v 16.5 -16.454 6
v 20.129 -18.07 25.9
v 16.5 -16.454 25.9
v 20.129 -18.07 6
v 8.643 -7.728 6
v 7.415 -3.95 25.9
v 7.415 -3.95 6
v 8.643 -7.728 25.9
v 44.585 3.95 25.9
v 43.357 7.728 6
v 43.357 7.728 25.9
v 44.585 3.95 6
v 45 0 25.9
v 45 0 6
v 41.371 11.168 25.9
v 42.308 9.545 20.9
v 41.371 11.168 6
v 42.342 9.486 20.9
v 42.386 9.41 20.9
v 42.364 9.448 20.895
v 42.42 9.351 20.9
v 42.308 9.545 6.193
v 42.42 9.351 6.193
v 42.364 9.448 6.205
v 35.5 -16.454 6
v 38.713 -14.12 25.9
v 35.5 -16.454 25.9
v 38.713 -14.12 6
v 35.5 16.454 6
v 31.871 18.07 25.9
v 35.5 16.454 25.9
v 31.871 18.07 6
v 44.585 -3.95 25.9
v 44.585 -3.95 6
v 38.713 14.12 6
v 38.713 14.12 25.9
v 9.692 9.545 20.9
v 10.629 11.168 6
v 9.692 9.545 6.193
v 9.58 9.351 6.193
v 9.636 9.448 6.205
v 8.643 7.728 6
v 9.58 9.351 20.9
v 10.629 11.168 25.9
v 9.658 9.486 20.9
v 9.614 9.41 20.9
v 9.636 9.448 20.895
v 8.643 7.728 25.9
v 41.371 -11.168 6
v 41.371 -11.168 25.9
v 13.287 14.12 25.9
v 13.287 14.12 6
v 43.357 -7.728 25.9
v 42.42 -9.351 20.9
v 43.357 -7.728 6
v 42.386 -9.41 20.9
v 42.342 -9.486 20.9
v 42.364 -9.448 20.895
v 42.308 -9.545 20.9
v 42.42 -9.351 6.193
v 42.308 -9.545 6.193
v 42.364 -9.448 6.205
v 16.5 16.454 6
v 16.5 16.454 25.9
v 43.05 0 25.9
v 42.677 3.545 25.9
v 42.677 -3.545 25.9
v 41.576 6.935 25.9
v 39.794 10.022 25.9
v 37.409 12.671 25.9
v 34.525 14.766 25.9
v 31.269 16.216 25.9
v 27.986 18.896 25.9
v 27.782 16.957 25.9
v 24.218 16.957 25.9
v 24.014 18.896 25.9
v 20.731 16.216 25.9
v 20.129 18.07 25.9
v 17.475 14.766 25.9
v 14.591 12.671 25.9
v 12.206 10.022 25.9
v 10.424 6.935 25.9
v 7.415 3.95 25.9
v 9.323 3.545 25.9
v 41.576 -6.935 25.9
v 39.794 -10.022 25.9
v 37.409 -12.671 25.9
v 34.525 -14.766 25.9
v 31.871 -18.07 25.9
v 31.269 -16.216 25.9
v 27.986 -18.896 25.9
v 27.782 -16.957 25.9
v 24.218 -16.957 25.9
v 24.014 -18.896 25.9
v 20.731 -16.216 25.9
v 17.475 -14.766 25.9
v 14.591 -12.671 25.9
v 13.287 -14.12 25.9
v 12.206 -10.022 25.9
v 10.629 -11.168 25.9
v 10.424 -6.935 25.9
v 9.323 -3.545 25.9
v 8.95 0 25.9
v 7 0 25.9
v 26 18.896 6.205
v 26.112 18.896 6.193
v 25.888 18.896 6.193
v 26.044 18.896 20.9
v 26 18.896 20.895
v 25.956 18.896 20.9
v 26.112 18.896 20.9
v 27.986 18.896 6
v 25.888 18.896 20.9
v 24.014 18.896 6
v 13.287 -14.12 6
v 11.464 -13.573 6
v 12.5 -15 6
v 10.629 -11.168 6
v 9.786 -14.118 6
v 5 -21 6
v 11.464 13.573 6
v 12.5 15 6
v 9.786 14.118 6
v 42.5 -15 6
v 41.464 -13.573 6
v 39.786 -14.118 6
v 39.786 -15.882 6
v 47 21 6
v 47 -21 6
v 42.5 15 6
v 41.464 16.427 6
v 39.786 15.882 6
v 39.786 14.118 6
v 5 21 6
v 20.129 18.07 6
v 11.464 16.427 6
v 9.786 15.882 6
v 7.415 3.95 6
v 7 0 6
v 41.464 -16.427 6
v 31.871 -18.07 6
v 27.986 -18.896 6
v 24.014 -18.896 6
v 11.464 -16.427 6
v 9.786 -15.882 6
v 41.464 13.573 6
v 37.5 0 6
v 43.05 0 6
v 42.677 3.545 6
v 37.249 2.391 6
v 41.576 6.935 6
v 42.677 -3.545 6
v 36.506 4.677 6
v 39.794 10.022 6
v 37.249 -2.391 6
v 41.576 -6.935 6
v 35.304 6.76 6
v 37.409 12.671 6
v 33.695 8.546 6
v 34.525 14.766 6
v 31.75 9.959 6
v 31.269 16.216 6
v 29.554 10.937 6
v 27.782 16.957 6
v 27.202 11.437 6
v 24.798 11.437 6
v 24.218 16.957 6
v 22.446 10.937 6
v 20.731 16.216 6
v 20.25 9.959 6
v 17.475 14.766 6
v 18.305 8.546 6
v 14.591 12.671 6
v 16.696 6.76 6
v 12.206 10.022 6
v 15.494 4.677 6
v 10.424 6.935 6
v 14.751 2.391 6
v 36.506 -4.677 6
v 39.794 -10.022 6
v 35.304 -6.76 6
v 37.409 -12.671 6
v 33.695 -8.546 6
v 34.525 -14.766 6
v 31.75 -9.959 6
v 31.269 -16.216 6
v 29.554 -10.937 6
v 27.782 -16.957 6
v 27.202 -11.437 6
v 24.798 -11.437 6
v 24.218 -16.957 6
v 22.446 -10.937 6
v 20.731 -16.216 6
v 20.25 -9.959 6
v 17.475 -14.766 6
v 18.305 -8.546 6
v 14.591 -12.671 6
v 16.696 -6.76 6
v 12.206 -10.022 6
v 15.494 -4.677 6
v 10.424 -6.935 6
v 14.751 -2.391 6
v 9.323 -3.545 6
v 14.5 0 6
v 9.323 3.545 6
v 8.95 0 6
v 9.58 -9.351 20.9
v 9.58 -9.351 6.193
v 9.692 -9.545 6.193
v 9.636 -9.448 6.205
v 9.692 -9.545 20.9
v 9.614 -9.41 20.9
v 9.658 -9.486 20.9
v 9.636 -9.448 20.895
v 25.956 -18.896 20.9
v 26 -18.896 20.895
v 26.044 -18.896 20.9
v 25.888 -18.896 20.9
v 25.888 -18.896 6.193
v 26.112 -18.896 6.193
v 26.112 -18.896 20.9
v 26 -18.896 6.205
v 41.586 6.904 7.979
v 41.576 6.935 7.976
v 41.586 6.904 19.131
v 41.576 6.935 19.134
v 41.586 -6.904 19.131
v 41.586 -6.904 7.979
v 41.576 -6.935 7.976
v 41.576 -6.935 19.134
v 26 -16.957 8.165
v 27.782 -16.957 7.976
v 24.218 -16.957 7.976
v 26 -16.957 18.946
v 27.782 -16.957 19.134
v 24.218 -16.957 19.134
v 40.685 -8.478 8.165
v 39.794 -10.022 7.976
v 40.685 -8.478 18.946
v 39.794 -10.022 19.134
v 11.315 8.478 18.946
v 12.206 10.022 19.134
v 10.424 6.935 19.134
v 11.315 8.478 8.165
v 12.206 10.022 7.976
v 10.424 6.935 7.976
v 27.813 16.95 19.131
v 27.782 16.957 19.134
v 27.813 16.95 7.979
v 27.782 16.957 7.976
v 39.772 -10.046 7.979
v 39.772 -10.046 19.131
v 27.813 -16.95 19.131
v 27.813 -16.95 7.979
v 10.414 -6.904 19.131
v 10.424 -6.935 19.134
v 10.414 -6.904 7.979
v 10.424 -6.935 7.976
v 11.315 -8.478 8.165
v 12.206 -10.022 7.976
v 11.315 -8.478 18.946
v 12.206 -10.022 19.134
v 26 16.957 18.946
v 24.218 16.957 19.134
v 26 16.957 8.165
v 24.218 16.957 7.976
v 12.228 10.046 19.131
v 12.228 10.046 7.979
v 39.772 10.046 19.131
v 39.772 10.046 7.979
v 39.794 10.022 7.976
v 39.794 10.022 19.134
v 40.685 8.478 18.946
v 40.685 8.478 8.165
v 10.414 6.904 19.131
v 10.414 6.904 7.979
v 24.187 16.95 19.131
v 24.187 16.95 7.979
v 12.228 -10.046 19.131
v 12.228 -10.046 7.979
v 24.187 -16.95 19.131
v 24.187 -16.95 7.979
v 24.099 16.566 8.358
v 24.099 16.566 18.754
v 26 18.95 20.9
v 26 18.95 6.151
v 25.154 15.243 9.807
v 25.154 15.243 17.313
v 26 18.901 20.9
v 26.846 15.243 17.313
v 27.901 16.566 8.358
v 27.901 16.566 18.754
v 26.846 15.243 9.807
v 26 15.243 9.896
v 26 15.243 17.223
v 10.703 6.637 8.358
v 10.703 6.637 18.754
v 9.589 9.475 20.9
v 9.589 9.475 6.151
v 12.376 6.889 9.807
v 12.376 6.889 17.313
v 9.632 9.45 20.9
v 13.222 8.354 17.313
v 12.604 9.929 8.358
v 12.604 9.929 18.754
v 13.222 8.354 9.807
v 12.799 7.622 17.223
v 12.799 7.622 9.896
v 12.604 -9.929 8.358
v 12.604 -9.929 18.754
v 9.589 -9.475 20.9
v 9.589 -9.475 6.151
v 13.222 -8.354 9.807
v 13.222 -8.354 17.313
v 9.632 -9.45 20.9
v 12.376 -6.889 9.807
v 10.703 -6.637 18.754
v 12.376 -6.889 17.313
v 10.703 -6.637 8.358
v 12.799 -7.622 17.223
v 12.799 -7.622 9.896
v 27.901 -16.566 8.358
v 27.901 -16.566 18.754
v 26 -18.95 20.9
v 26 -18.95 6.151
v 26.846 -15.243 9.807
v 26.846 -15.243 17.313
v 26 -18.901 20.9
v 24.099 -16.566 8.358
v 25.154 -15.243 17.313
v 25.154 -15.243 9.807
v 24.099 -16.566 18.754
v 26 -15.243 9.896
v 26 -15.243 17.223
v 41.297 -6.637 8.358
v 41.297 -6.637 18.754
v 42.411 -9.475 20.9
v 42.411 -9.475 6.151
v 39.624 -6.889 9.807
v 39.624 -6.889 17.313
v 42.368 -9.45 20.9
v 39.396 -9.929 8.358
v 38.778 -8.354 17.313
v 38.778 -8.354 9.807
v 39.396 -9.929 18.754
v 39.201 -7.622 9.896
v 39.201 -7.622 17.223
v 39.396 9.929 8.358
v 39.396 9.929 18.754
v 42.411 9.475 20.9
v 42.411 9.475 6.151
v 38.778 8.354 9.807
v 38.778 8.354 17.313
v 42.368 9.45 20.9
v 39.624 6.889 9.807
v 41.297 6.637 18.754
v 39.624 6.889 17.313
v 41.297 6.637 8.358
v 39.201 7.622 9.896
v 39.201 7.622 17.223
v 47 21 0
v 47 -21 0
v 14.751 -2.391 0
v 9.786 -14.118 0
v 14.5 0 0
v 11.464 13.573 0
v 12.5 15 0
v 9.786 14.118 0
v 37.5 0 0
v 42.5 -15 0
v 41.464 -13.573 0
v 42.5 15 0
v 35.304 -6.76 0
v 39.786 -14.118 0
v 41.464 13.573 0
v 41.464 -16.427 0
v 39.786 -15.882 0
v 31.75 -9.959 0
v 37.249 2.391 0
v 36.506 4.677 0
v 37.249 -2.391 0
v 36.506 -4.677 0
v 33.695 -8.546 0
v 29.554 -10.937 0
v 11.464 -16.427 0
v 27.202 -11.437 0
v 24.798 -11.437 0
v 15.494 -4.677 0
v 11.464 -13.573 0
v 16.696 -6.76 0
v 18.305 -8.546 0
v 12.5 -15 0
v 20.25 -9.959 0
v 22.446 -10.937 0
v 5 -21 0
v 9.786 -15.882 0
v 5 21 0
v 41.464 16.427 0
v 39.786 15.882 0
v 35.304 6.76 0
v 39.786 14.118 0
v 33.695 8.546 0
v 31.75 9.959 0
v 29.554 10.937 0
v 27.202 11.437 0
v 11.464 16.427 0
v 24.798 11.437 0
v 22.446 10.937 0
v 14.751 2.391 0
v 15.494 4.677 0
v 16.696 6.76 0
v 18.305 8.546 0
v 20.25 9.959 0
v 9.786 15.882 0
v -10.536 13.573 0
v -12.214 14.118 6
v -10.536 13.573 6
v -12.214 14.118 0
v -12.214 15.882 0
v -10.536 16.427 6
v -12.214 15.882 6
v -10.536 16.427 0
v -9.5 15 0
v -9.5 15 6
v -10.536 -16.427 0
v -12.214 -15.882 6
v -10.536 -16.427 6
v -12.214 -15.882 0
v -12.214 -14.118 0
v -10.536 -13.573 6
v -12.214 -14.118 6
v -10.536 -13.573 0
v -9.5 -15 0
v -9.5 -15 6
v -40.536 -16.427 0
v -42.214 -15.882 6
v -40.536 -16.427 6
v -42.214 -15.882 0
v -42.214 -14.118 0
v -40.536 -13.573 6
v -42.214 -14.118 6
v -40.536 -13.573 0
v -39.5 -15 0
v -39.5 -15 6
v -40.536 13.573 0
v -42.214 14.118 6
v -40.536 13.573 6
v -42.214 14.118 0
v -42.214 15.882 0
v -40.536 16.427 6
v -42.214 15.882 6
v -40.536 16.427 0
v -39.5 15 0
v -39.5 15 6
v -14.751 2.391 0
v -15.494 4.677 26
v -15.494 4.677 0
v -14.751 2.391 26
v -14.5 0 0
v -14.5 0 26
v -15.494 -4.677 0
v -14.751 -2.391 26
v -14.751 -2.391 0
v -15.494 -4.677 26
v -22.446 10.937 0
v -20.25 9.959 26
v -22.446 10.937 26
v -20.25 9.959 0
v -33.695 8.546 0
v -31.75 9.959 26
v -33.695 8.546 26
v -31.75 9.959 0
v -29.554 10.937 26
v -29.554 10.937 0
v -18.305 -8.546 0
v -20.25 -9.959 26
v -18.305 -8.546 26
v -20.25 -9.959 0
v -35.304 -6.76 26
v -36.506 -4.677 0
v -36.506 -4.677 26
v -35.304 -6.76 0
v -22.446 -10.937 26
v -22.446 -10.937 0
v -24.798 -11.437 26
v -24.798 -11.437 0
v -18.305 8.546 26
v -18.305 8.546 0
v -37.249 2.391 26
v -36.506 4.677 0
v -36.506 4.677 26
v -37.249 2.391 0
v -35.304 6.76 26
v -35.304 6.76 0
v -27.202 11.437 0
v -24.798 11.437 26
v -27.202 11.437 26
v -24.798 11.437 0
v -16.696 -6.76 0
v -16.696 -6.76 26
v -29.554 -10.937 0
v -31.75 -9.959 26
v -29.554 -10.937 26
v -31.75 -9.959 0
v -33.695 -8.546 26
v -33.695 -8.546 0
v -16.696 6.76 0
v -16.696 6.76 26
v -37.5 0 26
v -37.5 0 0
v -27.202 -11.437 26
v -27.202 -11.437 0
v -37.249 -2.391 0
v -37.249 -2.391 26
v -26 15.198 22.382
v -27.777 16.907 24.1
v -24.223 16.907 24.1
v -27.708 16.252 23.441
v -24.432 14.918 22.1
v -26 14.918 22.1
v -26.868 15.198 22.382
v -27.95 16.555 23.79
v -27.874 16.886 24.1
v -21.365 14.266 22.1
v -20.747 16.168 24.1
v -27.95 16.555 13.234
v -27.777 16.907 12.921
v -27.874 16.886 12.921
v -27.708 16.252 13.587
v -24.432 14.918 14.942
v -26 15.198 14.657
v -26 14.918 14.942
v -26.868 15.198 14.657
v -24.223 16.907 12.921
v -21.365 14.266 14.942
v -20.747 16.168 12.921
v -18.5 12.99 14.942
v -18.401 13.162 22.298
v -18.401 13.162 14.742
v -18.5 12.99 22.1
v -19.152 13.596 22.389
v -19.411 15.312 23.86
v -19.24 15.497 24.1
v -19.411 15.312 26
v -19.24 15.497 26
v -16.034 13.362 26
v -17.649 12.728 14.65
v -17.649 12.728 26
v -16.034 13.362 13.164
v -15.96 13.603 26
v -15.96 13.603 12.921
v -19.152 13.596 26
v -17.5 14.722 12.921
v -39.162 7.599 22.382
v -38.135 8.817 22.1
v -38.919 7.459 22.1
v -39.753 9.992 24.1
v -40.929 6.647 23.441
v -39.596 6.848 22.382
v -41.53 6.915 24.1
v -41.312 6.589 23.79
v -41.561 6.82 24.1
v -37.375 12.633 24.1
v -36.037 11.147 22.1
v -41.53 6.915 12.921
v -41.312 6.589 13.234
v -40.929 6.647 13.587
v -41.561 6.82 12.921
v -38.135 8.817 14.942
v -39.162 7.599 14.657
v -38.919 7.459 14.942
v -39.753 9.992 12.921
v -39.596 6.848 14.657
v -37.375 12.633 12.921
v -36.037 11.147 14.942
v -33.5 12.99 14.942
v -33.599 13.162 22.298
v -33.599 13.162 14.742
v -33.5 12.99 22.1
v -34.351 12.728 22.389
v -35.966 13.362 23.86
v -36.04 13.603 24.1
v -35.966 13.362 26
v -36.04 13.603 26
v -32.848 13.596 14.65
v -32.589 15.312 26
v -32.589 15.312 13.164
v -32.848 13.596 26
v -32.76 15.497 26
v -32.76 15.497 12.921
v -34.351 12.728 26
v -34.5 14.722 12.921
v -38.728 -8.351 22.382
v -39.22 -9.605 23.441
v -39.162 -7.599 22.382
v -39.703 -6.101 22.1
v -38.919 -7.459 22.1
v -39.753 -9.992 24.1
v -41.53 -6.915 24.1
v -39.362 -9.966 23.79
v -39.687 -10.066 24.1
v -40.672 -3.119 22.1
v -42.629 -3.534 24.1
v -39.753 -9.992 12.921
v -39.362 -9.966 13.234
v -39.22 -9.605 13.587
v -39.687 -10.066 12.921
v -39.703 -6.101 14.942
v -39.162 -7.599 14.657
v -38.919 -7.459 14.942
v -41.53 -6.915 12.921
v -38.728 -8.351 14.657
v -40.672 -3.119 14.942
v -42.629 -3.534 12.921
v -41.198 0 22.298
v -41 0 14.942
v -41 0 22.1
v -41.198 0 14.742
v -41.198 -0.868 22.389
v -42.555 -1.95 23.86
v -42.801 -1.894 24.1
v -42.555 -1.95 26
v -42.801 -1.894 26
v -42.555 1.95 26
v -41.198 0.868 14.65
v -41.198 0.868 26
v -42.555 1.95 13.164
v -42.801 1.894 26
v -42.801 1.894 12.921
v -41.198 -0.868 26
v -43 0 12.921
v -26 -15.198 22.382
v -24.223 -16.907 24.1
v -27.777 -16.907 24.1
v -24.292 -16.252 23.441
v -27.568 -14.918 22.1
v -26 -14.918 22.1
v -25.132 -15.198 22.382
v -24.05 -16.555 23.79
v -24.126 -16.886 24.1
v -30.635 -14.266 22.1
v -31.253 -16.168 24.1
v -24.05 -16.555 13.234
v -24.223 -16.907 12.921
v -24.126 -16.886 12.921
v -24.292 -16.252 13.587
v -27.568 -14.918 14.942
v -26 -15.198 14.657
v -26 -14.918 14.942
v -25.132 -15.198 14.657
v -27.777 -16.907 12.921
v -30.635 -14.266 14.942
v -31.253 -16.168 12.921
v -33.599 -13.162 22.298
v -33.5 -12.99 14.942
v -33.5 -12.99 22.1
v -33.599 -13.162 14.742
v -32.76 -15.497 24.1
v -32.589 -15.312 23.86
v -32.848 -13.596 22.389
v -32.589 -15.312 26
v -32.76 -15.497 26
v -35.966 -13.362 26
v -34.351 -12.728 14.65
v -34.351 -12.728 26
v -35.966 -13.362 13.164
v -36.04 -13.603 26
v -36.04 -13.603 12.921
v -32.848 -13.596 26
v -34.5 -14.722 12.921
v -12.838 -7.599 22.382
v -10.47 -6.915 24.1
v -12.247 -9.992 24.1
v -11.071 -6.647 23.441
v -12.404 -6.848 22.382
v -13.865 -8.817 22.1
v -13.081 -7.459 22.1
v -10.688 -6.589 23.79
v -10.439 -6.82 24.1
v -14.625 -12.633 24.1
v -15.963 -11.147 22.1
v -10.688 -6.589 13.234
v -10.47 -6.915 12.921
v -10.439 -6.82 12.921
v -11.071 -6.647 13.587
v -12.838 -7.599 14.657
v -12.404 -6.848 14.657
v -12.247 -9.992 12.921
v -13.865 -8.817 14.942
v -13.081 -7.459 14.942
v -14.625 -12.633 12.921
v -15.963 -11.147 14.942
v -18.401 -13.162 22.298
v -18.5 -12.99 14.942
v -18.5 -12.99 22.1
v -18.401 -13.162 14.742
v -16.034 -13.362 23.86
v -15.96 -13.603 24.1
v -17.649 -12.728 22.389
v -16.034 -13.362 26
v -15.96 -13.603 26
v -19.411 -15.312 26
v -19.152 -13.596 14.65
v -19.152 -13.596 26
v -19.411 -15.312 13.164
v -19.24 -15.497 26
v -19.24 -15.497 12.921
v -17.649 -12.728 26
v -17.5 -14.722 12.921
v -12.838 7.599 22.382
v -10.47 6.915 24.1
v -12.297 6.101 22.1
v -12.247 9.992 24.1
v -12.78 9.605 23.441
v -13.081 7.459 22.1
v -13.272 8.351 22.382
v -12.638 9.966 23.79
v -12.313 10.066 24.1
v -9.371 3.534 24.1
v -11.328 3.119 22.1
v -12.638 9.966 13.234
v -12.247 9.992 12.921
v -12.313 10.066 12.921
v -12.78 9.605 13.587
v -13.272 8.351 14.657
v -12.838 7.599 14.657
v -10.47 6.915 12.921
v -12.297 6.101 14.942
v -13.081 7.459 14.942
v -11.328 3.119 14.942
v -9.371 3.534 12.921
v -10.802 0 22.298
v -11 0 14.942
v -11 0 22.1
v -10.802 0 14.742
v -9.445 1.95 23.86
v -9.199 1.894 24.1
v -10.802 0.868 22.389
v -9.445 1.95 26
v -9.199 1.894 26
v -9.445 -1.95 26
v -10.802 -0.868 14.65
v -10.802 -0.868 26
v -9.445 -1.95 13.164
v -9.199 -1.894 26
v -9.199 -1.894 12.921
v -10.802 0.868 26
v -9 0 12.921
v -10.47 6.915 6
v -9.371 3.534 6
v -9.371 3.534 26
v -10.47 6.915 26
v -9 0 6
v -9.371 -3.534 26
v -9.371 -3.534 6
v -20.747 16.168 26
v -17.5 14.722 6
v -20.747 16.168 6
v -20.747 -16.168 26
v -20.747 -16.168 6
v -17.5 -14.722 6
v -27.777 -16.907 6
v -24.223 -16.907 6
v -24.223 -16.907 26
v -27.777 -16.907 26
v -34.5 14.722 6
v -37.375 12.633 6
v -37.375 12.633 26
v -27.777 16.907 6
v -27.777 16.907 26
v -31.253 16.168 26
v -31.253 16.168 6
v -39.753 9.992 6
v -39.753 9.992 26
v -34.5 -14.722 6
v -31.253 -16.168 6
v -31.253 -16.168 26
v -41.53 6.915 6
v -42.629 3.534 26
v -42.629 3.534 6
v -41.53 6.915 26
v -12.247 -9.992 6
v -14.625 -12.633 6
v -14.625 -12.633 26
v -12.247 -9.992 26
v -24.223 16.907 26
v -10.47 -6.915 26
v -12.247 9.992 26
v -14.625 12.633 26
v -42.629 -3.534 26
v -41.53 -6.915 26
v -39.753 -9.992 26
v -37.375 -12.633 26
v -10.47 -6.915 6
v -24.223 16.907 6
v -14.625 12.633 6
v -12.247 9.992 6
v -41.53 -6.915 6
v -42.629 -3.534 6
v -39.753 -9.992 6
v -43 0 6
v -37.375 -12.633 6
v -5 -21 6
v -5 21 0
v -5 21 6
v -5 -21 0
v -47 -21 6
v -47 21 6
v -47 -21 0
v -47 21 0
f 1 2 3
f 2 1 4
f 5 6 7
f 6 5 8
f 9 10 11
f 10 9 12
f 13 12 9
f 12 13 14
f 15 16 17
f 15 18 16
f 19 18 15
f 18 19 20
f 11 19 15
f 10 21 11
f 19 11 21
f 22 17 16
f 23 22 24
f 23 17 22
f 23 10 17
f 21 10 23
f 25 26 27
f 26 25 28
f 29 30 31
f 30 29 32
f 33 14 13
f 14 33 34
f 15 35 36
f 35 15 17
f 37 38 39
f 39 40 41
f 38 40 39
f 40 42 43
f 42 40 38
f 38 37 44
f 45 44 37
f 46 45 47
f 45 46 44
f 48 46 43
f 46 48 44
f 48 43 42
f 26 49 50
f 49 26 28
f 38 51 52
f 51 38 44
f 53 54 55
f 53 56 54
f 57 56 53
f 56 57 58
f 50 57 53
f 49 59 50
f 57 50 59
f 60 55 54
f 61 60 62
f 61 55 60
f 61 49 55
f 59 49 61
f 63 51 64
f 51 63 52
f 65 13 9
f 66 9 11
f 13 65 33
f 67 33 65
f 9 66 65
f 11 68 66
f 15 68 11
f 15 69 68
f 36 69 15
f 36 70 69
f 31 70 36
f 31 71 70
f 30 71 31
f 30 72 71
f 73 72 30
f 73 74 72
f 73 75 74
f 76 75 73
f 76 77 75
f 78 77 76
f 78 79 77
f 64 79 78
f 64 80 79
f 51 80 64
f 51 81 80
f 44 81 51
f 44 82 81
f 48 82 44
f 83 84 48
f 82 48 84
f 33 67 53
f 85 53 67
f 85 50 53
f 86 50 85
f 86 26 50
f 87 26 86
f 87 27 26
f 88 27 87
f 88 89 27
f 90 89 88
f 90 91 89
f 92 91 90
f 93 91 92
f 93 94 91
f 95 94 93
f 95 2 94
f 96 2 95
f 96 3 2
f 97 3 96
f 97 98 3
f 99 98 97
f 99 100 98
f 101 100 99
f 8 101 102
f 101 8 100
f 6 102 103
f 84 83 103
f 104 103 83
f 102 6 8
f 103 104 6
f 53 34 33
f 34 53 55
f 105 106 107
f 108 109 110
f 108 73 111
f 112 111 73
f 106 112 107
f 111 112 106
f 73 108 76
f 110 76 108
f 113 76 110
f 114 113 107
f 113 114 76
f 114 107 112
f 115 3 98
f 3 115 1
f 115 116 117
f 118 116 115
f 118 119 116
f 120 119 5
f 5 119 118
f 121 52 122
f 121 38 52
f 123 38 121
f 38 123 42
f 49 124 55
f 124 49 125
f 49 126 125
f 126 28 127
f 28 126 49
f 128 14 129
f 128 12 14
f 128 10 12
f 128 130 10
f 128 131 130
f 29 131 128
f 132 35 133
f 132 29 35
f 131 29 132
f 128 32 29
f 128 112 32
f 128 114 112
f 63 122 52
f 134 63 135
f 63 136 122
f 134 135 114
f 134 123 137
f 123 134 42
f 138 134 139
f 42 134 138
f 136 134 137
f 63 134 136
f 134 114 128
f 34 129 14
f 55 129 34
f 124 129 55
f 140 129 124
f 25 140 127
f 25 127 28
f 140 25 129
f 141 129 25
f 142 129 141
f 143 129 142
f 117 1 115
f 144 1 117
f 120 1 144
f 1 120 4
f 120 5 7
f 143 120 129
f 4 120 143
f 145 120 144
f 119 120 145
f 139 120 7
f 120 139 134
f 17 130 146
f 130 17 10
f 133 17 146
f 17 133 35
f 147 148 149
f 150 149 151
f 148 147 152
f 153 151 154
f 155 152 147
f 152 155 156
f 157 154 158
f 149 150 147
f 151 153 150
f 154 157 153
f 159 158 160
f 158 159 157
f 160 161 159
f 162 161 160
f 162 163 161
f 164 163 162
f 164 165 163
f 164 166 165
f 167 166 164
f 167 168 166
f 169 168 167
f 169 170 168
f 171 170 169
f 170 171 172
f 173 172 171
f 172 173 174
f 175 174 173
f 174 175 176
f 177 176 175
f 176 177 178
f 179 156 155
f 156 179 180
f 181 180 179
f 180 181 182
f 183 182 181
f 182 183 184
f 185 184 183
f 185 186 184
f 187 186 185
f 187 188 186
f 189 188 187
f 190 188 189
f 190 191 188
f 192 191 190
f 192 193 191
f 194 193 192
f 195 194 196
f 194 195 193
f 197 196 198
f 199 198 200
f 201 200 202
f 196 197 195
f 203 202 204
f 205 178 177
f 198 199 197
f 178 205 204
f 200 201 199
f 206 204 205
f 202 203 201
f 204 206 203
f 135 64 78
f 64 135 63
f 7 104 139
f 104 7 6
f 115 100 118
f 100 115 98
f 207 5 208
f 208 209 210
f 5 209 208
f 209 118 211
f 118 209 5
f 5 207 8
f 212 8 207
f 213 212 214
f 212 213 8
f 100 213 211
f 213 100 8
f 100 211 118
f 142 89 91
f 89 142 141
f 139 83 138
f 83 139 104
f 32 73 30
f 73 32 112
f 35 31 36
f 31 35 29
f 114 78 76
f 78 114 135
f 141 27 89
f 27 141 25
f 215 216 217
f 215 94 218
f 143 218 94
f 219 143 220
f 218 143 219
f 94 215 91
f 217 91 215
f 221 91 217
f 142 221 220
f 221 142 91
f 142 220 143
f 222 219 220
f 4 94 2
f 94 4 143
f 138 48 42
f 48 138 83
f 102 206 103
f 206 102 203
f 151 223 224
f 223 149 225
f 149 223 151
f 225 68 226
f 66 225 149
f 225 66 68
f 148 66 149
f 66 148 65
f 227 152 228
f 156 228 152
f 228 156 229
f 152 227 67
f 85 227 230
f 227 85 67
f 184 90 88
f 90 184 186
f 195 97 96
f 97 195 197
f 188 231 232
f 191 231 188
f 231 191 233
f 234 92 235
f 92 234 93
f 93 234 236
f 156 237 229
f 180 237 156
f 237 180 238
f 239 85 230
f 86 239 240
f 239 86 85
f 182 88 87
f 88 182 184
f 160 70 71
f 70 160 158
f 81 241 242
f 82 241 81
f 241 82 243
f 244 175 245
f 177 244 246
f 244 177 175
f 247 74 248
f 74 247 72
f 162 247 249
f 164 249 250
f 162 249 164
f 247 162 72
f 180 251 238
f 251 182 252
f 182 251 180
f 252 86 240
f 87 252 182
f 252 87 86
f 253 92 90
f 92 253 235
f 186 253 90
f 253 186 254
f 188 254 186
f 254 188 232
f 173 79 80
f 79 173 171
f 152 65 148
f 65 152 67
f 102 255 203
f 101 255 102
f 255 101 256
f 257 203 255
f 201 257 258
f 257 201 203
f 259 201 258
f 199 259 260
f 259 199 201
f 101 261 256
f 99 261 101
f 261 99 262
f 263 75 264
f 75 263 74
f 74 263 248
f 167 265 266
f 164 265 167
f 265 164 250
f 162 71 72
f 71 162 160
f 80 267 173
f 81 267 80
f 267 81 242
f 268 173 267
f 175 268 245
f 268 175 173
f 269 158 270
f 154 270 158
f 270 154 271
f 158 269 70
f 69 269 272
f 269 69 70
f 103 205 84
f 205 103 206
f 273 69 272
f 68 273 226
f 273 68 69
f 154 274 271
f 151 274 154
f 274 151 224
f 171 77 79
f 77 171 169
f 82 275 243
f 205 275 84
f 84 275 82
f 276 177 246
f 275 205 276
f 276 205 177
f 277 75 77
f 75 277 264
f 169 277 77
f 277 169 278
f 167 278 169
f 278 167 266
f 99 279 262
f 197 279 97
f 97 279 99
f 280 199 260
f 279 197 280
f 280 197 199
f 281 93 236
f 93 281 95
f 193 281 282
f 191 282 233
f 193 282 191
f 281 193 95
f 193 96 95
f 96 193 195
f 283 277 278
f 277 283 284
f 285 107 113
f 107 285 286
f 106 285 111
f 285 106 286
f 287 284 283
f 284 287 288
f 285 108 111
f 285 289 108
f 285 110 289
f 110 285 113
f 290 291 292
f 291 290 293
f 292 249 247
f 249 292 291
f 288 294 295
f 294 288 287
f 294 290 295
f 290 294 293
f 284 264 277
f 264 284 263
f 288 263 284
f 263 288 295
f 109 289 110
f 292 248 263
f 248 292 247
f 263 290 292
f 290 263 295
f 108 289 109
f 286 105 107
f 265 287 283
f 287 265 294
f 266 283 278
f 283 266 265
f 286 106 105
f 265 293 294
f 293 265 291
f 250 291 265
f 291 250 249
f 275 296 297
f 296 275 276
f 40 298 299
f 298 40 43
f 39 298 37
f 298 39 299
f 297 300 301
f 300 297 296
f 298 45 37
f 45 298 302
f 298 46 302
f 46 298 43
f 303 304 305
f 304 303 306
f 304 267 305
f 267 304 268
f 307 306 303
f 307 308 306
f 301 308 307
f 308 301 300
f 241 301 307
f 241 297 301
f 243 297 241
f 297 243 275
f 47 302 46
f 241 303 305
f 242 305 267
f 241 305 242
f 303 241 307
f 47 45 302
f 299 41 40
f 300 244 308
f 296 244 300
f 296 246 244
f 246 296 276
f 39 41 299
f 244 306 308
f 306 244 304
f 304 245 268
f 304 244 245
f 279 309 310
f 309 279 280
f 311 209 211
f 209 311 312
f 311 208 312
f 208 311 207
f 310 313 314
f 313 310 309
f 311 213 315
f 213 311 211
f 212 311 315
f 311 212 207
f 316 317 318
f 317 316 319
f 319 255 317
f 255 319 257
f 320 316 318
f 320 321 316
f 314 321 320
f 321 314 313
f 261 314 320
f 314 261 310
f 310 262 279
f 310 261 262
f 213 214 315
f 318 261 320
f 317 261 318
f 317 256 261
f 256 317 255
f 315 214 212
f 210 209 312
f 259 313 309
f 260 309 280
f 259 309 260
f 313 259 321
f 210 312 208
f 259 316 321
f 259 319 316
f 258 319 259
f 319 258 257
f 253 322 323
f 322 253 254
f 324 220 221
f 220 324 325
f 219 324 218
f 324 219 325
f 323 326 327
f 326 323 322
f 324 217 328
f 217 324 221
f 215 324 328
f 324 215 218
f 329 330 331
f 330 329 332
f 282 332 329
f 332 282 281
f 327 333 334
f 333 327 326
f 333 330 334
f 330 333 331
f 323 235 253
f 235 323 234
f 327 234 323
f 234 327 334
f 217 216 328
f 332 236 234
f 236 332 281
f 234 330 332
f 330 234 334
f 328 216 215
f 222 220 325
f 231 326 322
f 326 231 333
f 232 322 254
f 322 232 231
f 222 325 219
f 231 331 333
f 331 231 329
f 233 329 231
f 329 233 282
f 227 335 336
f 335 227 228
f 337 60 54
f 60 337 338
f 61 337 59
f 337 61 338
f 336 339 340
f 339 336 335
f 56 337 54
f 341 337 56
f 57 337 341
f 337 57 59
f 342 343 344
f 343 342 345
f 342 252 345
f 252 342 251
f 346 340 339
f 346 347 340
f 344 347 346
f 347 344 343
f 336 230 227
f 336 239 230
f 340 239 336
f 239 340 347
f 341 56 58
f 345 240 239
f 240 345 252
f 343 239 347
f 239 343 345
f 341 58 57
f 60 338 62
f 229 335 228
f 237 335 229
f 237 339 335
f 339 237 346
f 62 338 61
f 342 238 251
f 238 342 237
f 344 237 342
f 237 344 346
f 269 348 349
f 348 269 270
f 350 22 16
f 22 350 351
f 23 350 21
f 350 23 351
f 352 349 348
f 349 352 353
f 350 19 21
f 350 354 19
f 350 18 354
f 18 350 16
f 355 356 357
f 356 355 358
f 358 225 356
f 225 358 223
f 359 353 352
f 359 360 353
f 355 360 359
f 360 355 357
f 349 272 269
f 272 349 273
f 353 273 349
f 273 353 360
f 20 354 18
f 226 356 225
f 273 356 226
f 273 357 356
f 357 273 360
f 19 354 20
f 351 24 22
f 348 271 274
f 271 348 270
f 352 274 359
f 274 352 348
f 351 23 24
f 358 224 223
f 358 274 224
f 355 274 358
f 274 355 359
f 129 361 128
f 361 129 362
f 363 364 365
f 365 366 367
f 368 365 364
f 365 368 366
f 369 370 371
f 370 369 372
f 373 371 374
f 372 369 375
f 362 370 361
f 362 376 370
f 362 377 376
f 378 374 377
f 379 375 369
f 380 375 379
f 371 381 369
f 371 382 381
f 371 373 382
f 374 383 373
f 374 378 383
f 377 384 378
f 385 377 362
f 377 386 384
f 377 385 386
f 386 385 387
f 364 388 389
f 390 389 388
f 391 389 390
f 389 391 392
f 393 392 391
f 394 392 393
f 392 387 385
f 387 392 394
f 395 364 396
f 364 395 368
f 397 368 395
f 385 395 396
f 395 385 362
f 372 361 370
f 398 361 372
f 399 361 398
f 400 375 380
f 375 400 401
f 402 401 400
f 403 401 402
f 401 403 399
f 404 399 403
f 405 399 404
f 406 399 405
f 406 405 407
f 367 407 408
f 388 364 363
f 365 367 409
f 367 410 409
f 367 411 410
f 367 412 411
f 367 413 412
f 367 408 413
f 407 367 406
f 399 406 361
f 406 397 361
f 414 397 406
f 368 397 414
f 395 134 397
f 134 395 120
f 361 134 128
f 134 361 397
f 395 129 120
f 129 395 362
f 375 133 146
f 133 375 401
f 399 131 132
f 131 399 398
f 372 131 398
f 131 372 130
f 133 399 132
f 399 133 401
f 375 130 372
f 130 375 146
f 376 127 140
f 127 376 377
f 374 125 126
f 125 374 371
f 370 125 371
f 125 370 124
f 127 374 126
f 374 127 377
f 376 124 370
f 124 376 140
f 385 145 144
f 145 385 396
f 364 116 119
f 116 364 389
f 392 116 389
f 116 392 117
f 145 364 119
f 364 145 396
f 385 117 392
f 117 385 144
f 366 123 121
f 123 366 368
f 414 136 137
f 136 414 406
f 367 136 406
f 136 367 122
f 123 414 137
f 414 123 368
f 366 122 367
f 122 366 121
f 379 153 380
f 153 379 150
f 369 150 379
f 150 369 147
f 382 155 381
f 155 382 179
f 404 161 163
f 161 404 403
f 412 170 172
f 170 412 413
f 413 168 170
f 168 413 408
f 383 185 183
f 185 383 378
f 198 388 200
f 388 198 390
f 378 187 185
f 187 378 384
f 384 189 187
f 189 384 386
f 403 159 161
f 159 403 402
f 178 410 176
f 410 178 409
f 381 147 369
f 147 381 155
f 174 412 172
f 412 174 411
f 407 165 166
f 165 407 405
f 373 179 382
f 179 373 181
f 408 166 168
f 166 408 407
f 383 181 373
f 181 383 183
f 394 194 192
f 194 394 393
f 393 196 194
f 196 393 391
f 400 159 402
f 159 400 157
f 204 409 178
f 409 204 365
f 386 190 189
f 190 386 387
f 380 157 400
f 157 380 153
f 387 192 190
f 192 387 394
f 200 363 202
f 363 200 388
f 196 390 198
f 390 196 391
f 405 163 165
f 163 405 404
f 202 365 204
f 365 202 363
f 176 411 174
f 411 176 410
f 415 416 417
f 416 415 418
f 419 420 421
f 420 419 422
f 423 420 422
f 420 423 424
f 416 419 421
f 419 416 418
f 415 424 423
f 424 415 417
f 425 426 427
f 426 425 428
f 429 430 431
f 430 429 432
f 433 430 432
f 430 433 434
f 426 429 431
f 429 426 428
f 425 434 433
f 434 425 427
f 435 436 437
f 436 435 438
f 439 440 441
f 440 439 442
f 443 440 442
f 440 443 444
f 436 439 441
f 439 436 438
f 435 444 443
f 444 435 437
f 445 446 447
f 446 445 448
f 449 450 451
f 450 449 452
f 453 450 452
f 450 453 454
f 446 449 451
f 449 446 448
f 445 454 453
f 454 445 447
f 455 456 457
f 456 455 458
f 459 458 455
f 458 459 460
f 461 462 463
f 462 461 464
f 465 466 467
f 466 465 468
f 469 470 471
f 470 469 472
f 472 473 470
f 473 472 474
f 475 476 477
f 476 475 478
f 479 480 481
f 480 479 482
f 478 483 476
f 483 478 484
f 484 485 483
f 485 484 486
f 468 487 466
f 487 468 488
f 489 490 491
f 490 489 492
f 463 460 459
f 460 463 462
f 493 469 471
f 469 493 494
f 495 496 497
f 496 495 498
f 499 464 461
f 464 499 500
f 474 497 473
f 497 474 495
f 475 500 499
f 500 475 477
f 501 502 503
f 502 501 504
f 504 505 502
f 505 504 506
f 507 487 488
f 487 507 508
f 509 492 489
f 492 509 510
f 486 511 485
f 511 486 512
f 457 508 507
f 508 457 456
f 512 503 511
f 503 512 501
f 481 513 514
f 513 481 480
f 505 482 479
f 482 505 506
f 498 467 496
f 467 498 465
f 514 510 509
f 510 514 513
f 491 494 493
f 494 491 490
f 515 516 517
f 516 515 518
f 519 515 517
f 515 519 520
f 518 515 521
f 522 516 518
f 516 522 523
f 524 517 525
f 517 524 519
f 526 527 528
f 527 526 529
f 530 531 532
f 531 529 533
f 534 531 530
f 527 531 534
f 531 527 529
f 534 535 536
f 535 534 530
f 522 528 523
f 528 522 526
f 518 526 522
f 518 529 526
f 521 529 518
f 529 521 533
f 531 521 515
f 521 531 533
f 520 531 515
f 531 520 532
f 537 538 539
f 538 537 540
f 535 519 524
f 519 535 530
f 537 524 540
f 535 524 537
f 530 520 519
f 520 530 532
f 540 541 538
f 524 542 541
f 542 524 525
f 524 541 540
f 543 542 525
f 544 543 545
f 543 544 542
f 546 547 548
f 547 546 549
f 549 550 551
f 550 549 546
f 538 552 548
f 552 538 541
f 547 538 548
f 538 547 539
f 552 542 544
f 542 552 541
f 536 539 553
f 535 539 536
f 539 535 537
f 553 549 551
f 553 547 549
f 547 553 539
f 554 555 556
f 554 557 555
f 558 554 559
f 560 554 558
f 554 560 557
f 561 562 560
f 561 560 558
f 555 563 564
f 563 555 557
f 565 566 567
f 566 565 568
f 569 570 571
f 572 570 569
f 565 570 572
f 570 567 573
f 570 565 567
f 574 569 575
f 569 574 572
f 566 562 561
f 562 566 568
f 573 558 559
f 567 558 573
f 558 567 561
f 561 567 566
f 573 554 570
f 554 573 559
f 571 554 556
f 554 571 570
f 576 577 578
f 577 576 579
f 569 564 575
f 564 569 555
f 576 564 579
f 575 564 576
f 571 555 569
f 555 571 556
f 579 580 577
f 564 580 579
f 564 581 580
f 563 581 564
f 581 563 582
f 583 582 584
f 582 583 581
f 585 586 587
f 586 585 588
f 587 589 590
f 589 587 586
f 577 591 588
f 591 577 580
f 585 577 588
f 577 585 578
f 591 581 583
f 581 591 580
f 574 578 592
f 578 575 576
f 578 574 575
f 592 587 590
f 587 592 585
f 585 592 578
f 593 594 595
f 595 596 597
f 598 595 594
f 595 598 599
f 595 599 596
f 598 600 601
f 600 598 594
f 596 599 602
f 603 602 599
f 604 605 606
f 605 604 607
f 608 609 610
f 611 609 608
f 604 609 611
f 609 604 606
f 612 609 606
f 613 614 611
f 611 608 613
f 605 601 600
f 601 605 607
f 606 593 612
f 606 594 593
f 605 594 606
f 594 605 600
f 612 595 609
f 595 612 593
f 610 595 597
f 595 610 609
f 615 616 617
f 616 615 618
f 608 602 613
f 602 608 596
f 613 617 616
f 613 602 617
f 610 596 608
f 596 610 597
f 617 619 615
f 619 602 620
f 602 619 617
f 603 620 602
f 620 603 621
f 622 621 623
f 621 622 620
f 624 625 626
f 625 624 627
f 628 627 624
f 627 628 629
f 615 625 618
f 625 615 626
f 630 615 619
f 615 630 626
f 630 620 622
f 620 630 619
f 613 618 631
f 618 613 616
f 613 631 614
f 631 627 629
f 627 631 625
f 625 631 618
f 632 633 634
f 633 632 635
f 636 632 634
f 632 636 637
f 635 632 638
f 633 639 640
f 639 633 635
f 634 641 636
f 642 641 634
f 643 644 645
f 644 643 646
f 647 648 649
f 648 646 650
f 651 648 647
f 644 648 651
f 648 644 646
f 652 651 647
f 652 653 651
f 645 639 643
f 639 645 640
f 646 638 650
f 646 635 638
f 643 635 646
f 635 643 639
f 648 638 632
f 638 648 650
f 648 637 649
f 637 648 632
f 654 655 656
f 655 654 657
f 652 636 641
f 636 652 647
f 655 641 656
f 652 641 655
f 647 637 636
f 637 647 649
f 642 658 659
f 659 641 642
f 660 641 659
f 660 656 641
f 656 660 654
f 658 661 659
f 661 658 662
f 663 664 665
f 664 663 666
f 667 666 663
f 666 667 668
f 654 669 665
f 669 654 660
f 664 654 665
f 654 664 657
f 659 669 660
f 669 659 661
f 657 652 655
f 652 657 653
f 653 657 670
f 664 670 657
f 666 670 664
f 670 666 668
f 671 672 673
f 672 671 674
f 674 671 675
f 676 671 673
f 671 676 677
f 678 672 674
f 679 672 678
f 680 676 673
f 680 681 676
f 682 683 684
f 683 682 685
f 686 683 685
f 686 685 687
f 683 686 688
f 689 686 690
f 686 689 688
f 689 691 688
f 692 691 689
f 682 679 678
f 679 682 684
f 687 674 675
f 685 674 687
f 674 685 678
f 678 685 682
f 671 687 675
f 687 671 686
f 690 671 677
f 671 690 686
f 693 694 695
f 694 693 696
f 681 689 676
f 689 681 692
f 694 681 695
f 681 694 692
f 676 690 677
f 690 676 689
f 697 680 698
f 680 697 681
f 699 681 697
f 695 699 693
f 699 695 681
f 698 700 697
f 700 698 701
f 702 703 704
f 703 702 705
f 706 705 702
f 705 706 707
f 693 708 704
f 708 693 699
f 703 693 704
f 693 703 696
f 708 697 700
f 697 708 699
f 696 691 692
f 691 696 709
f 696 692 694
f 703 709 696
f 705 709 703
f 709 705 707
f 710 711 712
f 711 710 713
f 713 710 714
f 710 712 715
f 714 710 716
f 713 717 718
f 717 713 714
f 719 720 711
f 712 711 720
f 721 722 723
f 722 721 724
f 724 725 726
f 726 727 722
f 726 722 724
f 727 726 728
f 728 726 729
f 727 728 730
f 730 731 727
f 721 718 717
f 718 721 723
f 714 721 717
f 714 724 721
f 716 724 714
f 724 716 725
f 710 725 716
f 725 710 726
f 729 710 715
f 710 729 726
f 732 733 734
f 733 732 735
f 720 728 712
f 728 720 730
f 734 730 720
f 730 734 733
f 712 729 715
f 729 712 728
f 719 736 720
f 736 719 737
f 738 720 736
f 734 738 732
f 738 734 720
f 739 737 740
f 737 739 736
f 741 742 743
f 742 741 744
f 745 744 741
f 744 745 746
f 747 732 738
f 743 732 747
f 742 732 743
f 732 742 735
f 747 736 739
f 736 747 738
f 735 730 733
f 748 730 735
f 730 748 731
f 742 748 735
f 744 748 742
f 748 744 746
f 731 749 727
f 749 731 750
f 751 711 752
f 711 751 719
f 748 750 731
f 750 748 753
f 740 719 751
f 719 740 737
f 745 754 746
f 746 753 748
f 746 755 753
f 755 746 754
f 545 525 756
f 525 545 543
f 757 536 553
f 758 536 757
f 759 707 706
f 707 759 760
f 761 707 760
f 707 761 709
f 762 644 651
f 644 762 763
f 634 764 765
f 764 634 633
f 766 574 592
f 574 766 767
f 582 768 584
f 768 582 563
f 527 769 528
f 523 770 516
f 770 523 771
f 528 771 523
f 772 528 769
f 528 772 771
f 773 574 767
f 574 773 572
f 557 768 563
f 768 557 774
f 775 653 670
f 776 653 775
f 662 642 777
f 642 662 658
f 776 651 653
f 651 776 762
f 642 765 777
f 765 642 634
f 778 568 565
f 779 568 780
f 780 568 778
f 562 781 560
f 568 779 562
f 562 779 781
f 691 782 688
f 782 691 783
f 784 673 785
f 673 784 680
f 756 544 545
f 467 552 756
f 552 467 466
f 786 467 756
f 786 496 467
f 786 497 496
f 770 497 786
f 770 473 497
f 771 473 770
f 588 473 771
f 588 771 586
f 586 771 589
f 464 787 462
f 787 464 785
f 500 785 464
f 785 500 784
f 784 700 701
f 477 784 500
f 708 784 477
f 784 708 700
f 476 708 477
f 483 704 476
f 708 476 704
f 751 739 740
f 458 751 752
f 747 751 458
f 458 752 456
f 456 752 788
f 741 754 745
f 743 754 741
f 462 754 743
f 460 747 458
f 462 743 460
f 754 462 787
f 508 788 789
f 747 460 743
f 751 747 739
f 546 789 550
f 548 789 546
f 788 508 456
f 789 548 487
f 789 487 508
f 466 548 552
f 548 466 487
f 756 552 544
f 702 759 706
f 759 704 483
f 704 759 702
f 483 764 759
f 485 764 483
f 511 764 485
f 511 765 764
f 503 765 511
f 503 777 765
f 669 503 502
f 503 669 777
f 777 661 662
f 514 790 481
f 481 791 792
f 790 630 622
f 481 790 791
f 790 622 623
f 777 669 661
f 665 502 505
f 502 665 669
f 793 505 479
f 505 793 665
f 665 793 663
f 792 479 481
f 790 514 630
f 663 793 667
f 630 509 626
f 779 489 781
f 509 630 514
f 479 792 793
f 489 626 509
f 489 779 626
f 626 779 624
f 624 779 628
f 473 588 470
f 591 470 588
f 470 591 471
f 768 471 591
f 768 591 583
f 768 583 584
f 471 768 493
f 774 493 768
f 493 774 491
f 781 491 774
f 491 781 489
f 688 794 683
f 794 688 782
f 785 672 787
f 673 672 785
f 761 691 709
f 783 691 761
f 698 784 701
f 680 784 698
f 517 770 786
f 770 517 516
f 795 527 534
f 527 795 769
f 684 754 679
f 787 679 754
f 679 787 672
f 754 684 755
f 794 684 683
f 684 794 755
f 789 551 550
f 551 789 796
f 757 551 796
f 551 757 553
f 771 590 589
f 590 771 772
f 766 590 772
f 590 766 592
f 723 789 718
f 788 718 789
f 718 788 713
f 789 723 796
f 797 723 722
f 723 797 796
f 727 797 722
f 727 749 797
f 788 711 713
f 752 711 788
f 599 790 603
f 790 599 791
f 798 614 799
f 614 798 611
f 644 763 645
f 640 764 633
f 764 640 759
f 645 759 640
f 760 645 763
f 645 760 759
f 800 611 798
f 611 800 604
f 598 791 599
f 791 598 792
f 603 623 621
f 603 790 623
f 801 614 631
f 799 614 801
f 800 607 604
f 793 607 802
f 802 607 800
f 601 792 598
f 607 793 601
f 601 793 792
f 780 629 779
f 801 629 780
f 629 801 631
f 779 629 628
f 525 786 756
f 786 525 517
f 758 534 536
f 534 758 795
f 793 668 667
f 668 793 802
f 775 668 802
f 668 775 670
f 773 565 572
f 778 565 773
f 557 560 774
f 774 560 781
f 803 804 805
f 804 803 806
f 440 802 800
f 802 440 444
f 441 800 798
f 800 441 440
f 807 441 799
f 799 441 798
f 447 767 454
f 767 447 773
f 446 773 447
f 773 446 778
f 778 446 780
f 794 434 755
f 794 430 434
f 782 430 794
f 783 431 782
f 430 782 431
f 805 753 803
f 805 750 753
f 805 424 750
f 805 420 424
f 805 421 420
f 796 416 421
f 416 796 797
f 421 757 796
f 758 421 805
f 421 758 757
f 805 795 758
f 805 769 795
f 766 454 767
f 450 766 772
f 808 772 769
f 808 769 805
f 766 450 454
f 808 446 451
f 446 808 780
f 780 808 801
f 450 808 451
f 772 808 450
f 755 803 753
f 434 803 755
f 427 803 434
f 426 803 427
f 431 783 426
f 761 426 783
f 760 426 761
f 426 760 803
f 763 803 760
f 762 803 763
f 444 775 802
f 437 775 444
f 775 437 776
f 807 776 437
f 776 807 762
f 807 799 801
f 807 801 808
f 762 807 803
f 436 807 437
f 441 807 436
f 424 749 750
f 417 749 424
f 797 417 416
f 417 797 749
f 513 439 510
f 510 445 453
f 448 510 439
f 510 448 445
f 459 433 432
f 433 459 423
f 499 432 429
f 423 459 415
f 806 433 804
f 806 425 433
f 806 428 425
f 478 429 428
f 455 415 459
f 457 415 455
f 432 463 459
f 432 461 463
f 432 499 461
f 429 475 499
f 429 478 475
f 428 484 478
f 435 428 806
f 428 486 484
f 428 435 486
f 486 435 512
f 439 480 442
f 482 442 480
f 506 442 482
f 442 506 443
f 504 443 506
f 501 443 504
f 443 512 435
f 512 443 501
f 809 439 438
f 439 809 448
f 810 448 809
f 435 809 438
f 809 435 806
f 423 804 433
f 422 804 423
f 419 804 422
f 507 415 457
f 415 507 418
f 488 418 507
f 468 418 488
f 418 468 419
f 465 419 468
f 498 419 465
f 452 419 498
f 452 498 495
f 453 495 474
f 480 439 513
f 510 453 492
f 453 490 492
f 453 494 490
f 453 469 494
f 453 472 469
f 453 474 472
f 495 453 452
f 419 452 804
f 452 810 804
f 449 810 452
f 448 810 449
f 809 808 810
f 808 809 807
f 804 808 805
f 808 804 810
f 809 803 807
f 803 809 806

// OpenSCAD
// stepper twist mount
// tigger@interthingy.com
// 201029061241

// twist clip stepper mount

// modes
// 0 -  base only
// 1 - socket only
// 2 - cutaway
// 3 - interference check
// 4 - single stl

mode = 4;

// variables
nema = 17;

bolt = 3;
size = 42;
hole_size = 30;
base_thickness = 6;
boss_radius = 15;
inner_hole_radius = 11.5;
mount_height = 20;

clip_depth = 15;
clip_thickness = 4;
slot_height = 15;

clip_count = 6;

// extras

overlap = 0.1;
clearance = 0.1;
inc = 360 / clip_count;
splitter = 150;

module
pip()
{
  inc = 360 / (2 * clip_count);
  clip_rad = boss_radius + clip_thickness / 2 - clip_thickness / 2;
  difference()
  {
    translate([ boss_radius + clip_thickness / 2, 0, clearance ]) cylinder(
      h = slot_height - 2 * clearance, r = clip_thickness / 2 - clearance / 2);
    translate([ 0, 0, -boss_radius - clip_thickness + slot_height - clearance ])
      cylinder(h = boss_radius + clip_thickness + overlap,
               r1 = 0,
               r2 = boss_radius + clip_thickness);
    translate([ 0, 0, clearance ])
      cylinder(h = boss_radius + clip_thickness + overlap * 2,
               r2 = 0,
               r1 = boss_radius + clip_thickness);
  }
}

module
slot()
{
  inc = 360 / (2 * clip_count);
  clip_rad = boss_radius + clip_thickness / 2 - clip_thickness / 2;
  difference()
  {
    rotate([ 0, 0, inc ]) translate([ boss_radius + clip_thickness / 2, 0, 0 ])
      cylinder(h = slot_height - overlap, r = clip_thickness / 2);
    union()
    {
      translate([ 0, 0, -boss_radius - clip_thickness + slot_height + overlap ])
        cylinder(h = boss_radius + clip_thickness,
                 r1 = 0,
                 r2 = boss_radius + clip_thickness);
      translate([ 0, 0, -overlap ])
        cylinder(h = boss_radius + clip_thickness + overlap * 2,
                 r2 = 0,
                 r1 = boss_radius + clip_thickness);
    }
  }
  difference()
  {
    union()
    {
      translate([ boss_radius + clip_thickness / 2, 0, 0 ])
        cylinder(h = clip_depth + overlap, r = clip_thickness / 2);
      intersection()
      {
        intersection()
        {
          rotate(-90, [ 0, 0, 1 ]) rotate(inc, [ 0, 0, 1 ])
            cube(size = boss_radius * 4);
          cube(size = boss_radius * 4);
        }
        difference()
        {
          cylinder(h = slot_height, r = boss_radius + clip_thickness + overlap);
          translate([ 0, 0, -overlap ])
            cylinder(h = slot_height + overlap * 2, r = clip_rad);
          translate(
            [ 0, 0, -boss_radius - clip_thickness + slot_height + overlap ])
            cylinder(h = boss_radius + clip_thickness,
                     r1 = 0,
                     r2 = boss_radius + clip_thickness);
        }
      }
    }
    translate([ 0, 0, -overlap ])
      cylinder(h = boss_radius + clip_thickness + overlap * 2,
               r2 = 0,
               r1 = boss_radius + clip_thickness);
  }
}

module
pips()
{
  inc = 360 / clip_count;
  for (z = [1:clip_count]) {
    rotate(z * inc, [ 0, 0, 1 ]) pip();
  }
}

module
slots()
{
  inc = 360 / clip_count;
  for (z = [1:clip_count]) {
    rotate(z * inc, [ 0, 0, 1 ]) slot();
  }
}

module
bolt_hole()
{
  union()
  {
    cylinder(h = base_thickness * 10, r = bolt / 2, center = true);
    //		translate([0,0,base_thickness*2])
    //		cylinder(h=base_thickness*10,r=bolt,center=false);
  }
}

module
holes()
{
  union()
  {
    // bolt holes
    translate([ hole_size / 2, hole_size / 2, -2 * base_thickness ])
      bolt_hole();
    translate([ hole_size / 2, -hole_size / 2, -2 * base_thickness ])
      bolt_hole();
    translate([ -hole_size / 2, -hole_size / 2, -2 * base_thickness ])
      bolt_hole();
    translate([ -hole_size / 2, hole_size / 2, -2 * base_thickness ])
      bolt_hole();

    // center hole
    cylinder(h = base_thickness + 3 * mount_height,
             r = inner_hole_radius,
             center = true);
  }
}

module
socket_base()
{
  union()
  {
    difference()
    {
      cylinder(h = mount_height - clearance, r = boss_radius + clip_thickness);
      cylinder(h = mount_height - clearance,
               r = boss_radius + clip_thickness / 2 + clearance / 2);
    }
    translate([ 0, 0, (clip_depth - slot_height) ]) rotate([ 0, 0, inc / 2 ])
      pips();
  }
}

module
twist_base()
{
  union()
  {
    difference()
    {
      translate([ 0, 0, -overlap ]) cylinder(
        h = mount_height + overlap, r = boss_radius + clip_thickness / 2);
      union() { translate([ 0, 0, mount_height - clip_depth ]) slots(); }
    }
  }
}

module
base()
{

  difference()
  {
    union()
    {
      translate([ 0, 0, base_thickness / 2 ])
        cube(size = [ size, size, base_thickness ], center = true);
      translate([ 0, 0, base_thickness ]) twist_base();
    }
    holes();
  }
}

module
socket()
{

  difference()
  {
    union()
    {
      translate([ 0, 0, base_thickness / 2 ])
        cube(size = [ size, size, base_thickness ], center = true);
      translate([ 0, 0, base_thickness ]) socket_base();
    }
    holes();
  }
}

module
placed_socket()
{
  translate([ 0, 0, 2 * base_thickness + mount_height ]) rotate([ 0, 180, 0 ])

    socket();
}

module
splitter()
{
  // for checking internal layout
  translate([ 0, -splitter / 2, -splitter / 2 ]) cube(splitter);
}

// modal display

if (mode == 0) {
  base();
}

if (mode == 1) {
  socket();
}

if (mode == 2) {
  rotate([ 0, 0, inc / 2 ]) difference()
  {
    placed_socket();
    // socket();
    rotate([ 0, 0, inc / 2 ]) splitter();
  }
  base();
}

if (mode == 3) {
  intersection()
  {
    placed_socket();
    base();
  }
}

if (mode == 4) {
  translate([ size / 2 + 5, 0, 0 ]) socket();
  translate([ -size / 2 - 5, 0, 0 ]) base();
}
